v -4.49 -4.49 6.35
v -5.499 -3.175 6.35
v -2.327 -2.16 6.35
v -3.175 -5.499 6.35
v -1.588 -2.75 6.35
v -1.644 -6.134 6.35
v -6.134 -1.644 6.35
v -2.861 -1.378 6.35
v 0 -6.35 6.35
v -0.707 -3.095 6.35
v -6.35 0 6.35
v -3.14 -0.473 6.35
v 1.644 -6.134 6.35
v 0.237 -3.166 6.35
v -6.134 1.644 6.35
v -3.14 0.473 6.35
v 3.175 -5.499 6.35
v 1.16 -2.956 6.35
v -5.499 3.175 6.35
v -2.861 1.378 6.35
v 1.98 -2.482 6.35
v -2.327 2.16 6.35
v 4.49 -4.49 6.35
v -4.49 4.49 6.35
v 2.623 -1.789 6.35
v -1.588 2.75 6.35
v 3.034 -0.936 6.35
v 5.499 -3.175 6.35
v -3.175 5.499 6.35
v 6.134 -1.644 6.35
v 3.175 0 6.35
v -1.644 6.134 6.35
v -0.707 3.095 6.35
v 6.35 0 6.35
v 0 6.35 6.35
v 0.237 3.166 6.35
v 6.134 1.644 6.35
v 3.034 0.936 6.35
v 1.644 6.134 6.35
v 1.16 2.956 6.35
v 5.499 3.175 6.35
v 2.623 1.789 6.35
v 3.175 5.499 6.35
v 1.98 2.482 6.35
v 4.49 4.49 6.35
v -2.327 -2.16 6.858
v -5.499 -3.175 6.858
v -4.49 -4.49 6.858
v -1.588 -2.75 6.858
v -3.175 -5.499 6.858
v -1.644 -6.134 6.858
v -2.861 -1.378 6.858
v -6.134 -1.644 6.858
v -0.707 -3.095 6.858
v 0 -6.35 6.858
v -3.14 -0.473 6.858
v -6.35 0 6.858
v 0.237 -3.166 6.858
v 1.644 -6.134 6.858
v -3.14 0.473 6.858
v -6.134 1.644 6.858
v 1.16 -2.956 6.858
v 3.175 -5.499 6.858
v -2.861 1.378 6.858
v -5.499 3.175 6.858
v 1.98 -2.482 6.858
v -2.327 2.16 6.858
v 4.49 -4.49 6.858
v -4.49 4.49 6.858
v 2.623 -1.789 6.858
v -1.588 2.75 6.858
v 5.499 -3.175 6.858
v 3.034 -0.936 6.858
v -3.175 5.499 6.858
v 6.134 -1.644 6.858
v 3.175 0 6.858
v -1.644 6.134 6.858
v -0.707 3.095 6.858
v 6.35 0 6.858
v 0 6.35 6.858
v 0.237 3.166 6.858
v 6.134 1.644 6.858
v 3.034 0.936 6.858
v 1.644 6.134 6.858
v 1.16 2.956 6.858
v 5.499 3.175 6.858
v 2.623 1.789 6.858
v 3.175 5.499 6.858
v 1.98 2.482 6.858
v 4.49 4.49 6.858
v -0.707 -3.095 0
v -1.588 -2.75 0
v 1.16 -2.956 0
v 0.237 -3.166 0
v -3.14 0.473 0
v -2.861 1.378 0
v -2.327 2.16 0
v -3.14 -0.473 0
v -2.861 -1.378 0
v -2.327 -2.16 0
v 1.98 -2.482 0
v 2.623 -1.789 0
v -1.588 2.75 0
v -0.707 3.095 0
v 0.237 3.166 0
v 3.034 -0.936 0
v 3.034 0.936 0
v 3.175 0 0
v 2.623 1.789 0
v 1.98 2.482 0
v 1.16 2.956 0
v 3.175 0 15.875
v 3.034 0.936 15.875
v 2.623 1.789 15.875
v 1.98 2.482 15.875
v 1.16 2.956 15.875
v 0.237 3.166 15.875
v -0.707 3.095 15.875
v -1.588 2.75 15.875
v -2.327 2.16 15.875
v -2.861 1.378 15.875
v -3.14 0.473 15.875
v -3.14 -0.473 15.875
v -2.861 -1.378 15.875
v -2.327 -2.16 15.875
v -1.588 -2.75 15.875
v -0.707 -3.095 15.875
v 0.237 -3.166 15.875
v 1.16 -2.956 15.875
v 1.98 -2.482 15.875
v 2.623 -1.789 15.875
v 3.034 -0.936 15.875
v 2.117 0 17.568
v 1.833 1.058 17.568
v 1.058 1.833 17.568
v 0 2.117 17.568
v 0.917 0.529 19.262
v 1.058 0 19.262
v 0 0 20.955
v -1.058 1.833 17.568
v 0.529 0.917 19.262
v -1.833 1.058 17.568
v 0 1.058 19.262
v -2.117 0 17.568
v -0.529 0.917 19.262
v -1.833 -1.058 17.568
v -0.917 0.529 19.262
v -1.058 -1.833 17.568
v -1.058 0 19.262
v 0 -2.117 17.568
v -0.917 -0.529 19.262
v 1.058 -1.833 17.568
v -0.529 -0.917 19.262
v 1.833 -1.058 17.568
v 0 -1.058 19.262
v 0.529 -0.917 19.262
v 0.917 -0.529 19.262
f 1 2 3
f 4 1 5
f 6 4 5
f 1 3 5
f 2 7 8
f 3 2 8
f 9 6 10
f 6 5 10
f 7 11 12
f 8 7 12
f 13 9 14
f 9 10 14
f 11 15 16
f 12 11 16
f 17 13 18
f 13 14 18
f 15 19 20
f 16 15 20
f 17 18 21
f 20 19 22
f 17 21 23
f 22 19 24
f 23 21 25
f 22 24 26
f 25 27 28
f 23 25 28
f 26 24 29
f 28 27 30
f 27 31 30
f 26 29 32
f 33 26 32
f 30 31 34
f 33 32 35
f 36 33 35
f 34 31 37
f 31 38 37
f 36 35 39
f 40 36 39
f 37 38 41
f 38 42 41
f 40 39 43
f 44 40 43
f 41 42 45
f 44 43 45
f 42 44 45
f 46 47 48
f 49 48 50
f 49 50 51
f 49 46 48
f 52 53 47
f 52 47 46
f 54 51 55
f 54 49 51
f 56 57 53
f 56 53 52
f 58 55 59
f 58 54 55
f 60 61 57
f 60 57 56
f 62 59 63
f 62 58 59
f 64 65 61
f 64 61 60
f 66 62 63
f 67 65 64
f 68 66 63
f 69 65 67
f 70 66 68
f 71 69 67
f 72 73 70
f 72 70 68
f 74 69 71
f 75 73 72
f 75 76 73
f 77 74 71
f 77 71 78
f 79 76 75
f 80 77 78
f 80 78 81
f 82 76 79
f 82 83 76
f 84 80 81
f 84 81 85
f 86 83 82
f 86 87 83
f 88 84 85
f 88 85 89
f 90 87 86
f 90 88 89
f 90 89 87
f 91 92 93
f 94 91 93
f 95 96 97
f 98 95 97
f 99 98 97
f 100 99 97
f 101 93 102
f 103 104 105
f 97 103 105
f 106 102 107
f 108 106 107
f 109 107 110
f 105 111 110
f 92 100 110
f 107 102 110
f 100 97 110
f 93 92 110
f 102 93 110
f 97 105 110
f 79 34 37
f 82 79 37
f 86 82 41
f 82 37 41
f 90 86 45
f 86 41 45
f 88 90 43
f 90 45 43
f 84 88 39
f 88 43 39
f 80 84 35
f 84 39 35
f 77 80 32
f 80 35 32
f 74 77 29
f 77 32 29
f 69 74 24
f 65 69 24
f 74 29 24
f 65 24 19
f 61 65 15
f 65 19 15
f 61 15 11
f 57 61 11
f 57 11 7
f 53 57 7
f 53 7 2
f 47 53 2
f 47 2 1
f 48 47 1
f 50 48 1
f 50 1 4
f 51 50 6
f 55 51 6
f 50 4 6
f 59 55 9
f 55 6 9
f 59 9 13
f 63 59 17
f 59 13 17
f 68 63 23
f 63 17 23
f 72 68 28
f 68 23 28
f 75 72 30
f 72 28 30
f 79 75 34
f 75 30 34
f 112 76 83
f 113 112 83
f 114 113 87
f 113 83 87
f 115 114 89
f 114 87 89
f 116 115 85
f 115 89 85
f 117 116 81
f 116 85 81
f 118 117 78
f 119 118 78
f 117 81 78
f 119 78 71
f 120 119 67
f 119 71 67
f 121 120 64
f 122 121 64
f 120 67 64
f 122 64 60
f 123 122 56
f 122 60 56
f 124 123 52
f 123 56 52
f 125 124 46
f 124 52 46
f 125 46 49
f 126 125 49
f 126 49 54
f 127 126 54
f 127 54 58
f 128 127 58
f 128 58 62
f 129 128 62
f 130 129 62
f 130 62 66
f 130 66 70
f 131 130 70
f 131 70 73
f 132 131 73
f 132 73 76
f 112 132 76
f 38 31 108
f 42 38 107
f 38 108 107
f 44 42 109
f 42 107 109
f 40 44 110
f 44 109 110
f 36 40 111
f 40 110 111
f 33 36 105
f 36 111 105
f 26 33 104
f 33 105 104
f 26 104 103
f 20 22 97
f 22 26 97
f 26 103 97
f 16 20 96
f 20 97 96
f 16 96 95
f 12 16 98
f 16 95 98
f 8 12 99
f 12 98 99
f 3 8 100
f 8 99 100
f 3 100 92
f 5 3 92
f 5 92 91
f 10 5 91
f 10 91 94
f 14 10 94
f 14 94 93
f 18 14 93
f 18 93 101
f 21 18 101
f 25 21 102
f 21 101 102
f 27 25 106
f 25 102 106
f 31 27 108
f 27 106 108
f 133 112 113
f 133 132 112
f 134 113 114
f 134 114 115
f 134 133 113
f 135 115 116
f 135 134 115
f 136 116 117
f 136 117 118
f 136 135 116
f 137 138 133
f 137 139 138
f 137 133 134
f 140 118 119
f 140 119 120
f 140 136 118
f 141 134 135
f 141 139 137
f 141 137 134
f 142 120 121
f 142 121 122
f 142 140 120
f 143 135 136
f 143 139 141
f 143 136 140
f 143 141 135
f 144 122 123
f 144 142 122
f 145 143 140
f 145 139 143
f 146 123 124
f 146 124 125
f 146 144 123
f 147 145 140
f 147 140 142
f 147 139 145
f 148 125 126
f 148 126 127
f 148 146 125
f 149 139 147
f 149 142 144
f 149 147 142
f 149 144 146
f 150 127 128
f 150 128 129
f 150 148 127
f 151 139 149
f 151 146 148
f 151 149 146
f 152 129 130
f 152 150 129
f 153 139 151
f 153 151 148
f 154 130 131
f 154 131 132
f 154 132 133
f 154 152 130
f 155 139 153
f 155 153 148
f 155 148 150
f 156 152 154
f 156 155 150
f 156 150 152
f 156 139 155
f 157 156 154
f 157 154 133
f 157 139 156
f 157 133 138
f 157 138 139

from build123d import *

# Parameters (mm, degrees)
F0_R      = 3.175
F1_DEPTH  = 15.875
F3_R      = 6.35
F4_DEPTH  = 0.508
F1_FACE_R = 3.175


with BuildPart() as f1:
    # F0 (on Top) → F1 (new body)
    with BuildSketch(Plane.XY):
        Circle(F0_R)
    extrude(amount=F1_DEPTH)

    # F3 (on offset) → F4 (join)
    with BuildSketch(Plane.XY.offset(6.35)):
        Circle(F3_R)
    extrude(amount=F4_DEPTH)

    # F1_face (on face) → F7 section 0
    with BuildSketch(Plane.XY.offset(15.875), mode=Mode.PRIVATE) as f7_s0:
        Circle(F1_FACE_R)
    loft([f7_s0.sketch, Vertex(0, 0, 20.955)])


solid = f1.part
